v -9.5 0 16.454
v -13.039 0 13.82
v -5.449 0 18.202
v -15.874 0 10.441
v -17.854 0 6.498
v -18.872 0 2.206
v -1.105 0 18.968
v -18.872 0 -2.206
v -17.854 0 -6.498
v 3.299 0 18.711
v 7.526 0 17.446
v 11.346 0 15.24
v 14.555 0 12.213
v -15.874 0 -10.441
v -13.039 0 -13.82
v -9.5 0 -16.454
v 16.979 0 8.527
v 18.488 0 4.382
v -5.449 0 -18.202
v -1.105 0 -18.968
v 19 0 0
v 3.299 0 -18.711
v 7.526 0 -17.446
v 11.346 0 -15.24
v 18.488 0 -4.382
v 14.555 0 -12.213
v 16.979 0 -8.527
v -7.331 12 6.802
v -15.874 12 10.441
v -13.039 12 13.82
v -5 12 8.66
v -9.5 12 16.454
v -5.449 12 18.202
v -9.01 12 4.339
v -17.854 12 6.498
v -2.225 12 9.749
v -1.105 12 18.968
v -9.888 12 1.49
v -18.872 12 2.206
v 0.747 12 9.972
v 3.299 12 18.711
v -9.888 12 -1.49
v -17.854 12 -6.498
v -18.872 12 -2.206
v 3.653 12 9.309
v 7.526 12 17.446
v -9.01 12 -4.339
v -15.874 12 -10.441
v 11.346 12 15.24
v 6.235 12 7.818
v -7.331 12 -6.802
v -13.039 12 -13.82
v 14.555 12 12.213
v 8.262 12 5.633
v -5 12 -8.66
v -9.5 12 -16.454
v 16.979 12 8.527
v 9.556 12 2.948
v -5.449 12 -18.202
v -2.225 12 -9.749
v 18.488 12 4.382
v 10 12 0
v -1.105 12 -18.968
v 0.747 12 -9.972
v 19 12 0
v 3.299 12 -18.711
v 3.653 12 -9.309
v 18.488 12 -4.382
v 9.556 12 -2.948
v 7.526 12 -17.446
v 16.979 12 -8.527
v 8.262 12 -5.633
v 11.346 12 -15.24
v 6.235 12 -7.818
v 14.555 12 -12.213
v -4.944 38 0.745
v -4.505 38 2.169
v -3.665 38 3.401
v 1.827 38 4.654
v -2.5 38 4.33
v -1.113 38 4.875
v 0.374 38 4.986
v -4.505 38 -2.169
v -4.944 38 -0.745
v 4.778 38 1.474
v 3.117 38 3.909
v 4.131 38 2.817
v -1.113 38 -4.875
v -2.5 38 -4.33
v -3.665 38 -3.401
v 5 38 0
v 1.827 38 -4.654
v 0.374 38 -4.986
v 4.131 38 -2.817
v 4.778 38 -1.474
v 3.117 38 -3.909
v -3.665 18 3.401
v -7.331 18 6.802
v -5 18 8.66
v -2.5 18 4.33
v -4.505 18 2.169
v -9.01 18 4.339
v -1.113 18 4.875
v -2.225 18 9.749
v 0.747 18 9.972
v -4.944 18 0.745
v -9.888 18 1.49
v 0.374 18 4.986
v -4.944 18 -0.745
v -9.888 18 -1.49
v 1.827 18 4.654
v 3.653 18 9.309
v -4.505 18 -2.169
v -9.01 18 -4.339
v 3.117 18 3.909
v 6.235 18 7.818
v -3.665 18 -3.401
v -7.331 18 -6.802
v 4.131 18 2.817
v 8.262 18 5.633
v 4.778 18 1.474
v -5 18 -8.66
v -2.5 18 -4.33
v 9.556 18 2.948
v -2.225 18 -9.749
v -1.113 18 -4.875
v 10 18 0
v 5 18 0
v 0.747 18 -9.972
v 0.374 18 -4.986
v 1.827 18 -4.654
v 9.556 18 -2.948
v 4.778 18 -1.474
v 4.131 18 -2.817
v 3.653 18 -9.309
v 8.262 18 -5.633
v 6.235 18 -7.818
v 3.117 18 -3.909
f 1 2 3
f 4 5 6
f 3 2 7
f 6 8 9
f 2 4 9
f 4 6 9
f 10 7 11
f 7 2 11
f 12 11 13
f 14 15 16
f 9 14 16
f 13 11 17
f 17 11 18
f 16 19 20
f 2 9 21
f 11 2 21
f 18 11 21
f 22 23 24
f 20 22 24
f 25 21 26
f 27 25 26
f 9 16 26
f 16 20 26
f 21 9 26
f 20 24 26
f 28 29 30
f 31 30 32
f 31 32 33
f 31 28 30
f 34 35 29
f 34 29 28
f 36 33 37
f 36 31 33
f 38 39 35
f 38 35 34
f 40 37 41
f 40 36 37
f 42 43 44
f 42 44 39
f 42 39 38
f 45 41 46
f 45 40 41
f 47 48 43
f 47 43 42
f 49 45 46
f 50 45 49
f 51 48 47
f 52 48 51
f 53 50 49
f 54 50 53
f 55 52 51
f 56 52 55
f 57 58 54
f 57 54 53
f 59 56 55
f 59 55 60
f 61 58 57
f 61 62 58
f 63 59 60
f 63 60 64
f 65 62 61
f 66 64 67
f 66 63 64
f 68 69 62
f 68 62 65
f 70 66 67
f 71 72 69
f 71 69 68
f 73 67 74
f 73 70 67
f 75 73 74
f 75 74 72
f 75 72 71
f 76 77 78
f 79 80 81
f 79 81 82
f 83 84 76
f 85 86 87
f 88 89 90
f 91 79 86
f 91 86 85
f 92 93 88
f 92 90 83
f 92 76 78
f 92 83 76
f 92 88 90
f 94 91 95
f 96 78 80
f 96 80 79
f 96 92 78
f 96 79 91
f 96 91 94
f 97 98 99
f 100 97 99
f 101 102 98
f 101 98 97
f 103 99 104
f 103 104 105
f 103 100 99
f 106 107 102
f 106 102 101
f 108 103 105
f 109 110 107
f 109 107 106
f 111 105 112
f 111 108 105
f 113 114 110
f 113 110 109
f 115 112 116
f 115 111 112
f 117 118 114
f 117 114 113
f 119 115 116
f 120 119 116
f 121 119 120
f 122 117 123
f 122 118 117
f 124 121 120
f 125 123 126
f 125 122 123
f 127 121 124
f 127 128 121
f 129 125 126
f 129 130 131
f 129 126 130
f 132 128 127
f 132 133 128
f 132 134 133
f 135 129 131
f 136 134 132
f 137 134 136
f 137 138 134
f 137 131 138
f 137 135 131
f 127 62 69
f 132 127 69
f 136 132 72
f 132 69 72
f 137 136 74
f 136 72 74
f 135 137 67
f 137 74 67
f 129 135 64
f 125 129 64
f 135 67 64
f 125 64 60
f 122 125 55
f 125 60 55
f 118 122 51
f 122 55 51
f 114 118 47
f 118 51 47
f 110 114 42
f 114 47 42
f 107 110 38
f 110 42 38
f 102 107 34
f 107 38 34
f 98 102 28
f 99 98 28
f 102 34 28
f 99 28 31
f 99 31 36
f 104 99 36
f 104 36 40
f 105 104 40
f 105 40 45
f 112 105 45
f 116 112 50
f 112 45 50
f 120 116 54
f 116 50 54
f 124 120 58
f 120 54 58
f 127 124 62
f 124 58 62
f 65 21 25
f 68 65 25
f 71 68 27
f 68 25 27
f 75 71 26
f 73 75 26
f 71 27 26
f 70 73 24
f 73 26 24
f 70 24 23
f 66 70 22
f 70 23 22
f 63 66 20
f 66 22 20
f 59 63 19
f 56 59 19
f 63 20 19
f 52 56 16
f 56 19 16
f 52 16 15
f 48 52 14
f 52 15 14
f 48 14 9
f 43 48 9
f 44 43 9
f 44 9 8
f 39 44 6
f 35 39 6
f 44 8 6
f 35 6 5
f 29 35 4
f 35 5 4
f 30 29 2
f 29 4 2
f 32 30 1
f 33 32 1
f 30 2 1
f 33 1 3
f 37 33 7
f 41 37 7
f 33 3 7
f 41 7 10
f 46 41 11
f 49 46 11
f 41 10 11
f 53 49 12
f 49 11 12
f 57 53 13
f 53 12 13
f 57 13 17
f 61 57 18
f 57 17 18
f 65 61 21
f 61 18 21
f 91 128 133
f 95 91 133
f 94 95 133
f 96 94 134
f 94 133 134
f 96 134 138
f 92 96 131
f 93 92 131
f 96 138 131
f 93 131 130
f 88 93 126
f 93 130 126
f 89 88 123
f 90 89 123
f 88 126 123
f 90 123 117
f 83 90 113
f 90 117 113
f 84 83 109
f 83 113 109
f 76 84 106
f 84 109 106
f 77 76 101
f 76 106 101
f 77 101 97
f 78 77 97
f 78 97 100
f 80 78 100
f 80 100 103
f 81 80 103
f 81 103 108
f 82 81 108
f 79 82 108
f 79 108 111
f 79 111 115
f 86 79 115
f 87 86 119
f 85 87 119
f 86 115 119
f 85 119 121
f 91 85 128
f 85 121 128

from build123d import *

# Parameters (mm, degrees)
SKETCH_1_R      = 19
EXTRUDE_1_DEPTH = 12
SKETCH_2_R      = 10
EXTRUDE_2_DEPTH = 6
SKETCH_3_R      = 5
EXTRUDE_3_DEPTH = 20


with BuildPart() as part:
    # 草图1 → 凸台-拉伸1 (new body)
    with BuildSketch(Plane(origin=(0, 0, 0), x_dir=(1, 0, 0), z_dir=(0, 1, 0))):
        Circle(SKETCH_1_R)
    extrude(amount=EXTRUDE_1_DEPTH)

    # 草图2 → 凸台-拉伸2 (add)
    with BuildSketch(Plane(origin=(0, 12, 0), x_dir=(1, 0, 0), z_dir=(0, 1, 0))):
        Circle(SKETCH_2_R)
    extrude(amount=EXTRUDE_2_DEPTH)

    # 草图3 → 凸台-拉伸3 (add)
    with BuildSketch(Plane(origin=(0, 18, 0), x_dir=(1, 0, 0), z_dir=(0, 1, 0))):
        Circle(SKETCH_3_R)
    extrude(amount=EXTRUDE_3_DEPTH)


solid = part.part
